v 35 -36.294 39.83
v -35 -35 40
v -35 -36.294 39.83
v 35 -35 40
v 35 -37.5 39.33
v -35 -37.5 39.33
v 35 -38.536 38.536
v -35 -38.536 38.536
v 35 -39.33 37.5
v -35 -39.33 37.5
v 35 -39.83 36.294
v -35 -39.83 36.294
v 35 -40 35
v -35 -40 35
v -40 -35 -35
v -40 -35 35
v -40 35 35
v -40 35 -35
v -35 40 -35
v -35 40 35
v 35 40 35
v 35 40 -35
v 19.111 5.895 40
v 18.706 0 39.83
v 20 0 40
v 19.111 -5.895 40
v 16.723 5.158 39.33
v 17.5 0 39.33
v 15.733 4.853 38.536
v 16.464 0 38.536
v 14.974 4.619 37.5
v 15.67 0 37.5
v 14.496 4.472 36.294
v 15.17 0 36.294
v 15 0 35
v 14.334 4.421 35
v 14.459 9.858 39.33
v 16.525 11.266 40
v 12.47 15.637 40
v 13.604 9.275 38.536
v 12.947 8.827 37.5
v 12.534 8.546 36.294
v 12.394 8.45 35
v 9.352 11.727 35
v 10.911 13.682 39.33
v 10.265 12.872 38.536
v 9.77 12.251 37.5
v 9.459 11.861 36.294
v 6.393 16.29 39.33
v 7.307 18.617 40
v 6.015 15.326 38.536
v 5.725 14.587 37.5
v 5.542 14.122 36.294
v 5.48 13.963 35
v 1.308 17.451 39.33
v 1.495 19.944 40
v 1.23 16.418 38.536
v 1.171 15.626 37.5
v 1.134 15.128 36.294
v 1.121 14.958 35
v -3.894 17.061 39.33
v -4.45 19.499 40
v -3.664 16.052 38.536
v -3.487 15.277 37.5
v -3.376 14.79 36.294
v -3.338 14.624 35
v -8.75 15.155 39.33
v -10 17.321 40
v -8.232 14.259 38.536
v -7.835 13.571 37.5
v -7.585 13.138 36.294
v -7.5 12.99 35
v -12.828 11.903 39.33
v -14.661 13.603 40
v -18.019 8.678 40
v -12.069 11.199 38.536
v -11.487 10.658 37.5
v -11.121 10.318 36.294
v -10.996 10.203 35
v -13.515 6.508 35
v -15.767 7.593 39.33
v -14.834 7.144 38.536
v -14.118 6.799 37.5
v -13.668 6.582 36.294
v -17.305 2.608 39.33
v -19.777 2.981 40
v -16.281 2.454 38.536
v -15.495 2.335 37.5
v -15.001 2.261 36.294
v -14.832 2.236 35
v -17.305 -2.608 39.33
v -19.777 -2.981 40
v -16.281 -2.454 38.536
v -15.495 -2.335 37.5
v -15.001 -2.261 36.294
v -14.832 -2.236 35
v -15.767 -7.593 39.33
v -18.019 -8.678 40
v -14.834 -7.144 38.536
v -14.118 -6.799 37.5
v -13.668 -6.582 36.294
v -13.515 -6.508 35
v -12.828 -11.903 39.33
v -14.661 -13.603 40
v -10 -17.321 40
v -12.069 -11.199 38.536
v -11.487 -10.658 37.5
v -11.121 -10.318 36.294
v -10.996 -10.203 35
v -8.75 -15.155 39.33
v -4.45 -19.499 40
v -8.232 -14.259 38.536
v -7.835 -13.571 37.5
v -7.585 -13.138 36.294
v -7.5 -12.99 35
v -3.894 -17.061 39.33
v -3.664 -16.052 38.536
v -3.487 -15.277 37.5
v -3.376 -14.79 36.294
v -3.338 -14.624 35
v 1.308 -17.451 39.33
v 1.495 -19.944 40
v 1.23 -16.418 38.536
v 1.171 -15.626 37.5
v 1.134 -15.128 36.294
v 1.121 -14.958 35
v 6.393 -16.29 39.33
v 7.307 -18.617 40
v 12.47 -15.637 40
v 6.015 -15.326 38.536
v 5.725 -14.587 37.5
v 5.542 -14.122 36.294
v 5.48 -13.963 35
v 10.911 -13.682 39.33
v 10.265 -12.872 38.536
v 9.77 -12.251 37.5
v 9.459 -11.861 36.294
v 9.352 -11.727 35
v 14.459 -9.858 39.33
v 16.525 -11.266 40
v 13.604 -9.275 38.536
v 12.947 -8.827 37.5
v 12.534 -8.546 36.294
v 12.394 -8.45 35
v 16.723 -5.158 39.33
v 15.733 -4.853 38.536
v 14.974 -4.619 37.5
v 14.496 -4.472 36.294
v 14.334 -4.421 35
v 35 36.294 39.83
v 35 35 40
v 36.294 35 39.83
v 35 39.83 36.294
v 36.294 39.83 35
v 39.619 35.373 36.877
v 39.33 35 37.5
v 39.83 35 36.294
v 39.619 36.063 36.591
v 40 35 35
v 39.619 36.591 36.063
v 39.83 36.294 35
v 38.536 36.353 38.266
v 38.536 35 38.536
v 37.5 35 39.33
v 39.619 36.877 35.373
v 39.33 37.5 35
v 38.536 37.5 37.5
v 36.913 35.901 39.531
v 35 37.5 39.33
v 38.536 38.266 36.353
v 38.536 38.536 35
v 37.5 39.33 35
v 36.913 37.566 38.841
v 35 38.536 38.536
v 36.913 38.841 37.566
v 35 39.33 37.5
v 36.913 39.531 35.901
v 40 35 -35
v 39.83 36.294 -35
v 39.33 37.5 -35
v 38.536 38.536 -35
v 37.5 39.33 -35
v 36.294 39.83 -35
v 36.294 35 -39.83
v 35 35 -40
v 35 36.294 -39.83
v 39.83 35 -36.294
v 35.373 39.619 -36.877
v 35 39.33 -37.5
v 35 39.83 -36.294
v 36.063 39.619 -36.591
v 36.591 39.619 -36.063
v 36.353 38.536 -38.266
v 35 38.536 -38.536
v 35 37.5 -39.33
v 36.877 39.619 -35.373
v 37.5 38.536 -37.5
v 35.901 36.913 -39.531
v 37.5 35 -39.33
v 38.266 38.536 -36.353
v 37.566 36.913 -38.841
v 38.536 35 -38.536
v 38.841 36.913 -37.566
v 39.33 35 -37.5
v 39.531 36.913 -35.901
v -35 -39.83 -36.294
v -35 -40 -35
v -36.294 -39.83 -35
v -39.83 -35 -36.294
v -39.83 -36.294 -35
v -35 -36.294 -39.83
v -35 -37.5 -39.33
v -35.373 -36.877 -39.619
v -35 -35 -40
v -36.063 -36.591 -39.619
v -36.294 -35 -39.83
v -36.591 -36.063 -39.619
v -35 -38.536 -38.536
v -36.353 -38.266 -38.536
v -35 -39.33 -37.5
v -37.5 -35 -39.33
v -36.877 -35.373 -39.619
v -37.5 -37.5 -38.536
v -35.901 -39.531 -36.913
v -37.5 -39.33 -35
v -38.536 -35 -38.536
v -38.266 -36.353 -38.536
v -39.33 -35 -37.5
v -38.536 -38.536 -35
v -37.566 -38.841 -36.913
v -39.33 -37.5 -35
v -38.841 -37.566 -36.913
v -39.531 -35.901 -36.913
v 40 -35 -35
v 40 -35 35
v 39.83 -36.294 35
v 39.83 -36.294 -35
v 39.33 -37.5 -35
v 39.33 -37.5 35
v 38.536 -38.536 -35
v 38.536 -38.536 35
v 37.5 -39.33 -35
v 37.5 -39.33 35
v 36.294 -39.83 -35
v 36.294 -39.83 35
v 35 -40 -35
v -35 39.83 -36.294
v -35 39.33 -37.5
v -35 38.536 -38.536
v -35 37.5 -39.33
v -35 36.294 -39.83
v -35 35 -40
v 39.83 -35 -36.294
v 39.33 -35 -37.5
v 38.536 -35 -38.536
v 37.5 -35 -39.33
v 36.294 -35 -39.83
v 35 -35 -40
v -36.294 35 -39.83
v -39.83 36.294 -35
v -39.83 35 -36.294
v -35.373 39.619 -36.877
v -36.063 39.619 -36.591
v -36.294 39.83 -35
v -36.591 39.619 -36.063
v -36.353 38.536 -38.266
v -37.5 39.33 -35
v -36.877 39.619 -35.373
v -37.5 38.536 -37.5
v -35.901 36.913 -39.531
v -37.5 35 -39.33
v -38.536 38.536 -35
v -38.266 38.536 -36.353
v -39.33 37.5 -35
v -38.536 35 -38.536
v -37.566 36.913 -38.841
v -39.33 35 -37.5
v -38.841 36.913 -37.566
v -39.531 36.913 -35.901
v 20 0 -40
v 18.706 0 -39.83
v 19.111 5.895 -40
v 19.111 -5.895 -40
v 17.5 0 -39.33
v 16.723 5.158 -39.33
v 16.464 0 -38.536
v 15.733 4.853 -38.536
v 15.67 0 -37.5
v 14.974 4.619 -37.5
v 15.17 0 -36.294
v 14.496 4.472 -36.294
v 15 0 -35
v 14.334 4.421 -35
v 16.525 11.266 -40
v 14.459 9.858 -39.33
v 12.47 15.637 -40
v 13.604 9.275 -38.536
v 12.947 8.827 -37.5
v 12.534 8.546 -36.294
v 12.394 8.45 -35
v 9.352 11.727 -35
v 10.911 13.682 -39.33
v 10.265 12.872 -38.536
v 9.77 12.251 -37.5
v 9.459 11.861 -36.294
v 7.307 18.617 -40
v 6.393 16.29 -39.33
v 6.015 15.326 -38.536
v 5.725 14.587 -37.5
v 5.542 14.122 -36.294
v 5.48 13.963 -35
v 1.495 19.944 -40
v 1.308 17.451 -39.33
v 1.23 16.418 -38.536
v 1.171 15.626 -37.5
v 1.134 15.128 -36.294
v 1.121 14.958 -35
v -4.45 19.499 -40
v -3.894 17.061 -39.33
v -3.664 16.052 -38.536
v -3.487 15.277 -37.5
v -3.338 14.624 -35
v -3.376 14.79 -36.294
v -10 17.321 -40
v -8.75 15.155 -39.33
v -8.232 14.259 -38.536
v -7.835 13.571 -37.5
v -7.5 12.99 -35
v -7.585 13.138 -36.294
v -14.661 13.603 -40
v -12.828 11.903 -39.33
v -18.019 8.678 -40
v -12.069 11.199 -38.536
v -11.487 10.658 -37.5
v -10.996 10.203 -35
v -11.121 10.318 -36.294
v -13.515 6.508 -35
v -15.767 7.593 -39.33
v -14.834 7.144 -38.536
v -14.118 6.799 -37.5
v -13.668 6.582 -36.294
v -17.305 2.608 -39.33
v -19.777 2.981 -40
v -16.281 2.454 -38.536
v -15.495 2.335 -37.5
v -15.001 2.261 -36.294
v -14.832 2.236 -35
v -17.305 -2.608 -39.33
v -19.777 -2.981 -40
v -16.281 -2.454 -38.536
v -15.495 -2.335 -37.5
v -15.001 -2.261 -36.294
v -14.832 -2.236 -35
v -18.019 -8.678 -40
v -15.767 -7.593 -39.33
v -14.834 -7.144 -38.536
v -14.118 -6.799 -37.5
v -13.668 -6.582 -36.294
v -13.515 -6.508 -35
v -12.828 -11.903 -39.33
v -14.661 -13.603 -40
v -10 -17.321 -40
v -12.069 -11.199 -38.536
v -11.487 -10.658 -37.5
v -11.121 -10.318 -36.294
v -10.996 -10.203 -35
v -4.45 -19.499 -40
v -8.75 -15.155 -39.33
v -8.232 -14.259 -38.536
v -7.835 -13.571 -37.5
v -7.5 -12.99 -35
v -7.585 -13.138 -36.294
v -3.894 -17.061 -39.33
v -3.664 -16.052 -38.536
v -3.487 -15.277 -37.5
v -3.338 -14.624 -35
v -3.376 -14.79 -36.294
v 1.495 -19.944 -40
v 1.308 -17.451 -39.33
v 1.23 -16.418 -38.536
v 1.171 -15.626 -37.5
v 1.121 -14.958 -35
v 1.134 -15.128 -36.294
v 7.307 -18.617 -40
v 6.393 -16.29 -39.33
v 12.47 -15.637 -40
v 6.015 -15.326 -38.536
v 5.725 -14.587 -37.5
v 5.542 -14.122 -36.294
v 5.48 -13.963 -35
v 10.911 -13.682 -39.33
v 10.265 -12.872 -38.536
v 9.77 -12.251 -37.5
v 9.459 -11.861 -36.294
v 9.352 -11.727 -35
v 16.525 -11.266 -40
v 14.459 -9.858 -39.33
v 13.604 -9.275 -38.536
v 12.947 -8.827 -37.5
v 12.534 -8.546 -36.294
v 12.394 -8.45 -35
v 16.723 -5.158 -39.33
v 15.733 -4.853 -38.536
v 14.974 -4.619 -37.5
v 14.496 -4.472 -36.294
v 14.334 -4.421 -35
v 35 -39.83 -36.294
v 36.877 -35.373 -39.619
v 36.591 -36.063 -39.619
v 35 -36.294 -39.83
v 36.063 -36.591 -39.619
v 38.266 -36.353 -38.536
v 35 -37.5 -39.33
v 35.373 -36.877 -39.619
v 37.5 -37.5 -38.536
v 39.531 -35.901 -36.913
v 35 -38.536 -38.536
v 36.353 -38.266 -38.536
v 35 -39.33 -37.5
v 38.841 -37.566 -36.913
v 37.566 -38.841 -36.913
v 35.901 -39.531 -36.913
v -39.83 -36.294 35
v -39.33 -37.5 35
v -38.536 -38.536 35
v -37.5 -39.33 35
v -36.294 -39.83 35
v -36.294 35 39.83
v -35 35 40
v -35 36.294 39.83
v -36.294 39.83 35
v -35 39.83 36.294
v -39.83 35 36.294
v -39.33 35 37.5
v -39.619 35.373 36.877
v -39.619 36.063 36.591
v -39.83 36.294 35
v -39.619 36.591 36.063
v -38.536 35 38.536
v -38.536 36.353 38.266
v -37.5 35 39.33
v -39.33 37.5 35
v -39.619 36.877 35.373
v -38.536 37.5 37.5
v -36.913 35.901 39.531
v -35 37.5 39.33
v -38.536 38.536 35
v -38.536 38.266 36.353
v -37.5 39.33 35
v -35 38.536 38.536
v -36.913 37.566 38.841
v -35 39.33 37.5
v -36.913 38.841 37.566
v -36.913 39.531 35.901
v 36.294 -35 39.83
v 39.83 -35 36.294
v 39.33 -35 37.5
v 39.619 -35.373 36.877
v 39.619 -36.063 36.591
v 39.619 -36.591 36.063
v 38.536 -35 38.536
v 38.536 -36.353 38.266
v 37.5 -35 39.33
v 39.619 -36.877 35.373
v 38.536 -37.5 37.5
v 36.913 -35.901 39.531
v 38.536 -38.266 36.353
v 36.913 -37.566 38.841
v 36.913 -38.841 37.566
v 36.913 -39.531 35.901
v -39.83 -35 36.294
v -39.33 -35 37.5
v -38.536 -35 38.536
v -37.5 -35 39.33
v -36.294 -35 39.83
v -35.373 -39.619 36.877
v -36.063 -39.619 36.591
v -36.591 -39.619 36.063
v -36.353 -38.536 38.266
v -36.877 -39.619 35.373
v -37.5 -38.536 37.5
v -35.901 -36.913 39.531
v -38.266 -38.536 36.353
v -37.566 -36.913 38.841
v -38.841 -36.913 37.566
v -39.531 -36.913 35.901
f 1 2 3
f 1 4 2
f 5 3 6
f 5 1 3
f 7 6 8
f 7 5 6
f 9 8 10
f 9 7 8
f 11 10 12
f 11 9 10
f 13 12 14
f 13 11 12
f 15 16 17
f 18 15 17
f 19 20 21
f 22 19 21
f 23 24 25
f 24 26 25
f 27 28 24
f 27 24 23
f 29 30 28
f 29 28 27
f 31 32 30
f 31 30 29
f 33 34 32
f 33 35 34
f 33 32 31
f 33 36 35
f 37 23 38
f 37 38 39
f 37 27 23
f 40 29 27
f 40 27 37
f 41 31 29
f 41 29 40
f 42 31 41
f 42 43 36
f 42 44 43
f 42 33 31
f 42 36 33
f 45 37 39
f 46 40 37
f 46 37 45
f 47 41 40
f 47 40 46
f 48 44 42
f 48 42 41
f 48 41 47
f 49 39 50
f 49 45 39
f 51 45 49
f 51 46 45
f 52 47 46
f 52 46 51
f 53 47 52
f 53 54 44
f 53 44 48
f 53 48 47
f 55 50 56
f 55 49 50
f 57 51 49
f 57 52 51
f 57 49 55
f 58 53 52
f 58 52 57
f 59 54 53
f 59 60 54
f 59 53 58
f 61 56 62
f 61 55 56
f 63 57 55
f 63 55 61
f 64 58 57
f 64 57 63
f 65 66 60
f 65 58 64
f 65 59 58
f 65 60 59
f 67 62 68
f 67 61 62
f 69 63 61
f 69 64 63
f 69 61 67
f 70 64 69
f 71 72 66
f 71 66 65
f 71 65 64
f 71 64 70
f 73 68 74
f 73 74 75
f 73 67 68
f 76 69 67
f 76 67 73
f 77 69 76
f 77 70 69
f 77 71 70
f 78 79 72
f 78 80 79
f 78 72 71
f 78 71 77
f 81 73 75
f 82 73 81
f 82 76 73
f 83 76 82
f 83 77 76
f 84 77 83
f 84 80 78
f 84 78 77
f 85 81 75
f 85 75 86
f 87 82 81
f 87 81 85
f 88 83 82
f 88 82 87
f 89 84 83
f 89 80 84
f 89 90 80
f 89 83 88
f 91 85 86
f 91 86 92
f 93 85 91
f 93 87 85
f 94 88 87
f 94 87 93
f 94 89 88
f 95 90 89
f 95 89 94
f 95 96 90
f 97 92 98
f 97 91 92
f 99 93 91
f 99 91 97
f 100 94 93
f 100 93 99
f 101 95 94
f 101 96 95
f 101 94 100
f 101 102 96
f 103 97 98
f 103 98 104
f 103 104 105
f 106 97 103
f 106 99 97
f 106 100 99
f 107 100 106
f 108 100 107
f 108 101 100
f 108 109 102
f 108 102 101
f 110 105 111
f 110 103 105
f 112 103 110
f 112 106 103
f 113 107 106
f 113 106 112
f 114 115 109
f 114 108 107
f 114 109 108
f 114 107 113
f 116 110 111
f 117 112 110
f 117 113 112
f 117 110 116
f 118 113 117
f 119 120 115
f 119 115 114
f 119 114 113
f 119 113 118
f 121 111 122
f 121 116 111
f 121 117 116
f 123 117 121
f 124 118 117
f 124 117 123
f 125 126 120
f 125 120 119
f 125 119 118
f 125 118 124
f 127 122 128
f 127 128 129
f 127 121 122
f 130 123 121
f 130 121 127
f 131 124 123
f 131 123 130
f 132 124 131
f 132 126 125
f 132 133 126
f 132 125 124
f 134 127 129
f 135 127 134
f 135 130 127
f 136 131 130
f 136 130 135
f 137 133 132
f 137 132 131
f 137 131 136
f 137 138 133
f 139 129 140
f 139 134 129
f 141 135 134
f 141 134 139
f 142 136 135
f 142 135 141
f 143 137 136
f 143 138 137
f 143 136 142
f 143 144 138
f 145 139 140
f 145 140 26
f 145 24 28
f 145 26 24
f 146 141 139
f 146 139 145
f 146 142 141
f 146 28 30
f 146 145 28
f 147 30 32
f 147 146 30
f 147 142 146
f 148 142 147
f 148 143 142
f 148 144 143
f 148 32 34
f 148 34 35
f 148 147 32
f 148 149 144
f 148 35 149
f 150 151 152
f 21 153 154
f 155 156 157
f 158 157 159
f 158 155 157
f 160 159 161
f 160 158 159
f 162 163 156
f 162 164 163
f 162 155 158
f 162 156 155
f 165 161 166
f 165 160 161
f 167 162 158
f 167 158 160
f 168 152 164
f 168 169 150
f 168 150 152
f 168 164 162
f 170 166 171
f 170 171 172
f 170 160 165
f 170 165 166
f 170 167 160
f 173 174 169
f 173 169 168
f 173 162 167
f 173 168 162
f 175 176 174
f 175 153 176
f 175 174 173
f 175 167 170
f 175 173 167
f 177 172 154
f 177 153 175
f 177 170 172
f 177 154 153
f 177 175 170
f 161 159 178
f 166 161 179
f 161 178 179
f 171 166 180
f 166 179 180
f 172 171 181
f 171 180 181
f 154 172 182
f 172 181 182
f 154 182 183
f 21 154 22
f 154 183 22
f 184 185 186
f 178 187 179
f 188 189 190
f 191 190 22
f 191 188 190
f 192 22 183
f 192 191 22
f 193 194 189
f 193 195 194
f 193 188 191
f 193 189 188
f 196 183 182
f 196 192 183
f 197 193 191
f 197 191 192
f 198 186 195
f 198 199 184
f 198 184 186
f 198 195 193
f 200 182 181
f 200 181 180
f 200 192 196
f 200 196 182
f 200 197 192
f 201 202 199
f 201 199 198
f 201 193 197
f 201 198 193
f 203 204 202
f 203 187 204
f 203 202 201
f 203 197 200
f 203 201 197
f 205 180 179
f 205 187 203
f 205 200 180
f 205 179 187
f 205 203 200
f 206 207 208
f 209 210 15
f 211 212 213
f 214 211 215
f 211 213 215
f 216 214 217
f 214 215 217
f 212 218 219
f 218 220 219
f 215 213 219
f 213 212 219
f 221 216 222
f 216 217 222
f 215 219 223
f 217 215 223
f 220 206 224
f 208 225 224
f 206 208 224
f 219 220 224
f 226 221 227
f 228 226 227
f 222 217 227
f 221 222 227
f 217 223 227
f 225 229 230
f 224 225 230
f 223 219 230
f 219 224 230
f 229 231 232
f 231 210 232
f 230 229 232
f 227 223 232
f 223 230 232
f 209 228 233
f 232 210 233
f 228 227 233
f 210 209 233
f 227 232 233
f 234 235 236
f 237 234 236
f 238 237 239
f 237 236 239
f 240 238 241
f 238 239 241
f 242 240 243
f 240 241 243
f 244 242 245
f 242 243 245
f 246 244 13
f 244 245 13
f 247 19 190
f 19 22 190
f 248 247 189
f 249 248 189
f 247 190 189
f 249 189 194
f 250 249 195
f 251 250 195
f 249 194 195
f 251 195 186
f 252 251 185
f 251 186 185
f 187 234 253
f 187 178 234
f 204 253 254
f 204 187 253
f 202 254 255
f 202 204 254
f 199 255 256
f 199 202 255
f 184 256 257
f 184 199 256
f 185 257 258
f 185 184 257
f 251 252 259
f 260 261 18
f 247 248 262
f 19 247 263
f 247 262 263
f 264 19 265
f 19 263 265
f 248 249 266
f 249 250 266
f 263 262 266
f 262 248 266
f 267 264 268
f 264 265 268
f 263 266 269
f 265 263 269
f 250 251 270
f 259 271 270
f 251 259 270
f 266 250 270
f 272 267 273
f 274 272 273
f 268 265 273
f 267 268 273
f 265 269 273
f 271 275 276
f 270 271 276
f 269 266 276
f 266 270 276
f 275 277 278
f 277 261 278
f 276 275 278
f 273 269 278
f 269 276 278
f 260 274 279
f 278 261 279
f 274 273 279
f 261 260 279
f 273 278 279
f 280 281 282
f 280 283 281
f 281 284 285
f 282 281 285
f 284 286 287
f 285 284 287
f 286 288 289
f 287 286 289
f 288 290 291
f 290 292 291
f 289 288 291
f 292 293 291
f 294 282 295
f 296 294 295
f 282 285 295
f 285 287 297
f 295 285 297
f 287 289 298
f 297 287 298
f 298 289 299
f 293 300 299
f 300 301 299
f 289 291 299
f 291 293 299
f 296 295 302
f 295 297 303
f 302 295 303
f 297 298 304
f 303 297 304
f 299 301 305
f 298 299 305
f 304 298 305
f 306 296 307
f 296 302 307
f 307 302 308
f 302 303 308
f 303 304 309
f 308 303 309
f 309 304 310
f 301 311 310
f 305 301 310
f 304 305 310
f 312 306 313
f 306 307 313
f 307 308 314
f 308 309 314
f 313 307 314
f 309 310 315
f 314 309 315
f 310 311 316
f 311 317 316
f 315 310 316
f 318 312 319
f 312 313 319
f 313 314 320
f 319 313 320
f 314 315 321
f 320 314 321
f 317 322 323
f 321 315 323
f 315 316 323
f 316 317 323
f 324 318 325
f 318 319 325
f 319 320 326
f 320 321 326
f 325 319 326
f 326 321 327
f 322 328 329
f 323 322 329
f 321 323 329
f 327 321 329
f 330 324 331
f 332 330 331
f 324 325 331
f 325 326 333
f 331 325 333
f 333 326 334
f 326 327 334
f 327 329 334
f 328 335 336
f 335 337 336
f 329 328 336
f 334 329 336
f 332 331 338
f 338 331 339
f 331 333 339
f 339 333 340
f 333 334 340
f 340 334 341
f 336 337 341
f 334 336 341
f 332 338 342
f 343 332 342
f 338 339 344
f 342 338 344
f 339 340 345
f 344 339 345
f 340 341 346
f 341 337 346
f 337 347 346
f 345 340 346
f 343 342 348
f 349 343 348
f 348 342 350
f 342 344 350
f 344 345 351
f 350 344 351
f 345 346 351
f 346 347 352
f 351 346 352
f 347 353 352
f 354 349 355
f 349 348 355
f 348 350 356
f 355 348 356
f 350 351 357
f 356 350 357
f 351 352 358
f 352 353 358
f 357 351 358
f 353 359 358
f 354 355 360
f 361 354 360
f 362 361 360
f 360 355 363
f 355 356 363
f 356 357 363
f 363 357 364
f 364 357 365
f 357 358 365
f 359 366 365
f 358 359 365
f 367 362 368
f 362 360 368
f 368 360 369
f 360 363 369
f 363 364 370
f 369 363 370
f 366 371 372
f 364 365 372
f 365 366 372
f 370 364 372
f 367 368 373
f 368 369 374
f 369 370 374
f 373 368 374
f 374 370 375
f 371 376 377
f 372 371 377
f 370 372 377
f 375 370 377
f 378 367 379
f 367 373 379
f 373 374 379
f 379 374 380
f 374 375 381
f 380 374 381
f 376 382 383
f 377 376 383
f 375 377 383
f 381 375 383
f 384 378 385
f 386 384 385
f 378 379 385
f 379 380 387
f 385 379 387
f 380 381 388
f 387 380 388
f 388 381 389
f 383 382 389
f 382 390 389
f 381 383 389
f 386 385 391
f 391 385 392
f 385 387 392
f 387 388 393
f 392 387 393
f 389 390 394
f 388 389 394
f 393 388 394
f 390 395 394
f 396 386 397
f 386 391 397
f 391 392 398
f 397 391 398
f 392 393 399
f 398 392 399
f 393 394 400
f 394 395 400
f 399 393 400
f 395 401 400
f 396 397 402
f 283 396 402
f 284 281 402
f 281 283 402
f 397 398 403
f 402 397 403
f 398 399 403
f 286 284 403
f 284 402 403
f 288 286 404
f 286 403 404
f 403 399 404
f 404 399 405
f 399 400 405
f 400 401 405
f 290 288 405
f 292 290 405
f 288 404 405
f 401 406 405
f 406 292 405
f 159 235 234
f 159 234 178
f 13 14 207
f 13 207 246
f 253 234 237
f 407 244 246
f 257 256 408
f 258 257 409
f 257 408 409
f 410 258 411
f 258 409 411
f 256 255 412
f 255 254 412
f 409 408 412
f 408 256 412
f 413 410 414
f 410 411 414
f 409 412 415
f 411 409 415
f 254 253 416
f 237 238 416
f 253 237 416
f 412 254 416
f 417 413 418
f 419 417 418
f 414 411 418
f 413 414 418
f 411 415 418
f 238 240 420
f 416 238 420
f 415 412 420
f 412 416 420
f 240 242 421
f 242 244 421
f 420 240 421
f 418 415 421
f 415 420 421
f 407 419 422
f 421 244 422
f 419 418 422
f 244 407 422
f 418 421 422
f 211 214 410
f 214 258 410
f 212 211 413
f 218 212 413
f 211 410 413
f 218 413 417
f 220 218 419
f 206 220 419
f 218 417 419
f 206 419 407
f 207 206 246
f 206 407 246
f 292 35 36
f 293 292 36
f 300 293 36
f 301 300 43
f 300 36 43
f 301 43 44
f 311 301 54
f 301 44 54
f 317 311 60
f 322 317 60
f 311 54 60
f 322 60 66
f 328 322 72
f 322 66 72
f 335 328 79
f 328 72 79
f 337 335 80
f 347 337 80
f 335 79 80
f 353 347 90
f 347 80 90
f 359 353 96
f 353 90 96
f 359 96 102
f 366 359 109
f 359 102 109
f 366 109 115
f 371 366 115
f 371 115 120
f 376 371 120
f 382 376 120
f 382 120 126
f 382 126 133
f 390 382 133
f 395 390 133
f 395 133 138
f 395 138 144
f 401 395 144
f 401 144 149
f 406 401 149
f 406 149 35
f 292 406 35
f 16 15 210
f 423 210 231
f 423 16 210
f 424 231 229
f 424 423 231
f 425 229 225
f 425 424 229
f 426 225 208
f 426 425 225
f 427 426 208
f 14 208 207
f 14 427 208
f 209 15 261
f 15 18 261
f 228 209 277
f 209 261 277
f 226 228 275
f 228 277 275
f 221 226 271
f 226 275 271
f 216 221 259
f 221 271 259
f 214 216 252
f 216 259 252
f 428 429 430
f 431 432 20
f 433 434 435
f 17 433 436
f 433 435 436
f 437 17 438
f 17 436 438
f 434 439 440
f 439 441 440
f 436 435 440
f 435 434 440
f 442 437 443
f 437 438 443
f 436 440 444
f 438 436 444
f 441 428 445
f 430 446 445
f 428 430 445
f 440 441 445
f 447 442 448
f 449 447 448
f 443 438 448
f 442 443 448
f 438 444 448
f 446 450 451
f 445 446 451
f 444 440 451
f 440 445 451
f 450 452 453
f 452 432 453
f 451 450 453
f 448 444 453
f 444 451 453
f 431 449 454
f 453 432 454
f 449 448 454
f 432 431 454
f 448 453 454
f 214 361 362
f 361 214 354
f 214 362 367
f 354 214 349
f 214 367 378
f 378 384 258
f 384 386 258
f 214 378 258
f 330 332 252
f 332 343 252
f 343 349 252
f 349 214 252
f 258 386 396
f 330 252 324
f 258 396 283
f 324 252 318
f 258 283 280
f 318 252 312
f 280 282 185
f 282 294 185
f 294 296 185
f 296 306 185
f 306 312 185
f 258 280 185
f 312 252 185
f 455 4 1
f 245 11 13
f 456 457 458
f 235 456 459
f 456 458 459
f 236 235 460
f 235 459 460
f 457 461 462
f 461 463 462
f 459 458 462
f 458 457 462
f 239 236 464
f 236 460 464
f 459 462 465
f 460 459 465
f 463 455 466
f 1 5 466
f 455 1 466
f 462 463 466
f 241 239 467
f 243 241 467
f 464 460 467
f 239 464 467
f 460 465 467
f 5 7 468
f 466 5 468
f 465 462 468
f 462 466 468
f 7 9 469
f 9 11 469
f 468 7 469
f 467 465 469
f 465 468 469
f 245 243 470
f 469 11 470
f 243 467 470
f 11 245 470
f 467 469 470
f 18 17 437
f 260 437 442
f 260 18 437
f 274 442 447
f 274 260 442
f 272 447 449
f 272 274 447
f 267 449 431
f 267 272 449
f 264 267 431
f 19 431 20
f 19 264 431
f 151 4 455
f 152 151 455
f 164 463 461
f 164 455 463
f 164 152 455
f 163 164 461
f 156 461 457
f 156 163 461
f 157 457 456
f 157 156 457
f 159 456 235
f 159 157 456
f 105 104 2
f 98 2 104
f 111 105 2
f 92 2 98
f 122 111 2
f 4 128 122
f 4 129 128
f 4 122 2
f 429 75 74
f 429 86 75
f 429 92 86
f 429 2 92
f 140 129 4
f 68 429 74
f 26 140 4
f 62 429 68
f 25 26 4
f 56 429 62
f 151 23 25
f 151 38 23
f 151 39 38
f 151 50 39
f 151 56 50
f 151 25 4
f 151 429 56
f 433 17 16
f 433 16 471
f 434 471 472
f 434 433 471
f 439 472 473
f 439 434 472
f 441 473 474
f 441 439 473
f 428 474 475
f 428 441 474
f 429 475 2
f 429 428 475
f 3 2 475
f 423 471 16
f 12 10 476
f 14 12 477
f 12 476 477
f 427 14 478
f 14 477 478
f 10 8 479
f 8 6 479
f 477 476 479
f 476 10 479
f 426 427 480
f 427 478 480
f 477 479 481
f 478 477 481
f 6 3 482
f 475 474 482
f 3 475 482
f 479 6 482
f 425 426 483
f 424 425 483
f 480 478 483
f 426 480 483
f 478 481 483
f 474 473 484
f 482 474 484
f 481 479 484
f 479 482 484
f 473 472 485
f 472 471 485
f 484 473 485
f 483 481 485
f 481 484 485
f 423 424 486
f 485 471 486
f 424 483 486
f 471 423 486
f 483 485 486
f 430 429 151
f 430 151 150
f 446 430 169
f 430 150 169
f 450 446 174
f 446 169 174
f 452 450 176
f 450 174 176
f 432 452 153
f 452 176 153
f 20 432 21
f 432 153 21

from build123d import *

# Parameters (mm, degrees)
F0_W     = 80
F0_H     = 80
F1_DEPTH = 40
F2_R     = 5
F3_R     = 15
F4_DEPTH = 80.001
F5_R     = 5


with BuildPart() as f1:
    # F0 (on Top) → F1 (new body, symmetric)
    with BuildSketch(Plane.XY):
        Rectangle(F0_W, F0_H)
    extrude(amount=F1_DEPTH, both=True)

    # F2
    f2_edges = [f1.edges().sort_by_distance(p)[0] for p in [
        (0, 40, 40),
        (-40, 0, 40),
        (0, -40, 40),
        (40, 0, 40),
        (-40, -40, 0),
        (40, -40, 0),
        (40, 0, -40),
        (0, -40, -40),
        (-40, 0, -40),
        (0, 40, -40),
        (-40, 40, 0),
        (40, 40, 0),
    ]]
    fillet(f2_edges, radius=F2_R)

    # F3 (on face) → F4 (cut, through all)
    with BuildSketch(Plane.XY.offset(40)):
        Circle(F3_R)
    extrude(amount=-F4_DEPTH, mode=Mode.SUBTRACT)

    # F5
    f5_edges = [f1.edges().sort_by_distance(p)[0] for p in [
        (-15, 0, 40),
        (-15, 0, -40),
    ]]
    fillet(f5_edges, radius=F5_R)


solid = f1.part
